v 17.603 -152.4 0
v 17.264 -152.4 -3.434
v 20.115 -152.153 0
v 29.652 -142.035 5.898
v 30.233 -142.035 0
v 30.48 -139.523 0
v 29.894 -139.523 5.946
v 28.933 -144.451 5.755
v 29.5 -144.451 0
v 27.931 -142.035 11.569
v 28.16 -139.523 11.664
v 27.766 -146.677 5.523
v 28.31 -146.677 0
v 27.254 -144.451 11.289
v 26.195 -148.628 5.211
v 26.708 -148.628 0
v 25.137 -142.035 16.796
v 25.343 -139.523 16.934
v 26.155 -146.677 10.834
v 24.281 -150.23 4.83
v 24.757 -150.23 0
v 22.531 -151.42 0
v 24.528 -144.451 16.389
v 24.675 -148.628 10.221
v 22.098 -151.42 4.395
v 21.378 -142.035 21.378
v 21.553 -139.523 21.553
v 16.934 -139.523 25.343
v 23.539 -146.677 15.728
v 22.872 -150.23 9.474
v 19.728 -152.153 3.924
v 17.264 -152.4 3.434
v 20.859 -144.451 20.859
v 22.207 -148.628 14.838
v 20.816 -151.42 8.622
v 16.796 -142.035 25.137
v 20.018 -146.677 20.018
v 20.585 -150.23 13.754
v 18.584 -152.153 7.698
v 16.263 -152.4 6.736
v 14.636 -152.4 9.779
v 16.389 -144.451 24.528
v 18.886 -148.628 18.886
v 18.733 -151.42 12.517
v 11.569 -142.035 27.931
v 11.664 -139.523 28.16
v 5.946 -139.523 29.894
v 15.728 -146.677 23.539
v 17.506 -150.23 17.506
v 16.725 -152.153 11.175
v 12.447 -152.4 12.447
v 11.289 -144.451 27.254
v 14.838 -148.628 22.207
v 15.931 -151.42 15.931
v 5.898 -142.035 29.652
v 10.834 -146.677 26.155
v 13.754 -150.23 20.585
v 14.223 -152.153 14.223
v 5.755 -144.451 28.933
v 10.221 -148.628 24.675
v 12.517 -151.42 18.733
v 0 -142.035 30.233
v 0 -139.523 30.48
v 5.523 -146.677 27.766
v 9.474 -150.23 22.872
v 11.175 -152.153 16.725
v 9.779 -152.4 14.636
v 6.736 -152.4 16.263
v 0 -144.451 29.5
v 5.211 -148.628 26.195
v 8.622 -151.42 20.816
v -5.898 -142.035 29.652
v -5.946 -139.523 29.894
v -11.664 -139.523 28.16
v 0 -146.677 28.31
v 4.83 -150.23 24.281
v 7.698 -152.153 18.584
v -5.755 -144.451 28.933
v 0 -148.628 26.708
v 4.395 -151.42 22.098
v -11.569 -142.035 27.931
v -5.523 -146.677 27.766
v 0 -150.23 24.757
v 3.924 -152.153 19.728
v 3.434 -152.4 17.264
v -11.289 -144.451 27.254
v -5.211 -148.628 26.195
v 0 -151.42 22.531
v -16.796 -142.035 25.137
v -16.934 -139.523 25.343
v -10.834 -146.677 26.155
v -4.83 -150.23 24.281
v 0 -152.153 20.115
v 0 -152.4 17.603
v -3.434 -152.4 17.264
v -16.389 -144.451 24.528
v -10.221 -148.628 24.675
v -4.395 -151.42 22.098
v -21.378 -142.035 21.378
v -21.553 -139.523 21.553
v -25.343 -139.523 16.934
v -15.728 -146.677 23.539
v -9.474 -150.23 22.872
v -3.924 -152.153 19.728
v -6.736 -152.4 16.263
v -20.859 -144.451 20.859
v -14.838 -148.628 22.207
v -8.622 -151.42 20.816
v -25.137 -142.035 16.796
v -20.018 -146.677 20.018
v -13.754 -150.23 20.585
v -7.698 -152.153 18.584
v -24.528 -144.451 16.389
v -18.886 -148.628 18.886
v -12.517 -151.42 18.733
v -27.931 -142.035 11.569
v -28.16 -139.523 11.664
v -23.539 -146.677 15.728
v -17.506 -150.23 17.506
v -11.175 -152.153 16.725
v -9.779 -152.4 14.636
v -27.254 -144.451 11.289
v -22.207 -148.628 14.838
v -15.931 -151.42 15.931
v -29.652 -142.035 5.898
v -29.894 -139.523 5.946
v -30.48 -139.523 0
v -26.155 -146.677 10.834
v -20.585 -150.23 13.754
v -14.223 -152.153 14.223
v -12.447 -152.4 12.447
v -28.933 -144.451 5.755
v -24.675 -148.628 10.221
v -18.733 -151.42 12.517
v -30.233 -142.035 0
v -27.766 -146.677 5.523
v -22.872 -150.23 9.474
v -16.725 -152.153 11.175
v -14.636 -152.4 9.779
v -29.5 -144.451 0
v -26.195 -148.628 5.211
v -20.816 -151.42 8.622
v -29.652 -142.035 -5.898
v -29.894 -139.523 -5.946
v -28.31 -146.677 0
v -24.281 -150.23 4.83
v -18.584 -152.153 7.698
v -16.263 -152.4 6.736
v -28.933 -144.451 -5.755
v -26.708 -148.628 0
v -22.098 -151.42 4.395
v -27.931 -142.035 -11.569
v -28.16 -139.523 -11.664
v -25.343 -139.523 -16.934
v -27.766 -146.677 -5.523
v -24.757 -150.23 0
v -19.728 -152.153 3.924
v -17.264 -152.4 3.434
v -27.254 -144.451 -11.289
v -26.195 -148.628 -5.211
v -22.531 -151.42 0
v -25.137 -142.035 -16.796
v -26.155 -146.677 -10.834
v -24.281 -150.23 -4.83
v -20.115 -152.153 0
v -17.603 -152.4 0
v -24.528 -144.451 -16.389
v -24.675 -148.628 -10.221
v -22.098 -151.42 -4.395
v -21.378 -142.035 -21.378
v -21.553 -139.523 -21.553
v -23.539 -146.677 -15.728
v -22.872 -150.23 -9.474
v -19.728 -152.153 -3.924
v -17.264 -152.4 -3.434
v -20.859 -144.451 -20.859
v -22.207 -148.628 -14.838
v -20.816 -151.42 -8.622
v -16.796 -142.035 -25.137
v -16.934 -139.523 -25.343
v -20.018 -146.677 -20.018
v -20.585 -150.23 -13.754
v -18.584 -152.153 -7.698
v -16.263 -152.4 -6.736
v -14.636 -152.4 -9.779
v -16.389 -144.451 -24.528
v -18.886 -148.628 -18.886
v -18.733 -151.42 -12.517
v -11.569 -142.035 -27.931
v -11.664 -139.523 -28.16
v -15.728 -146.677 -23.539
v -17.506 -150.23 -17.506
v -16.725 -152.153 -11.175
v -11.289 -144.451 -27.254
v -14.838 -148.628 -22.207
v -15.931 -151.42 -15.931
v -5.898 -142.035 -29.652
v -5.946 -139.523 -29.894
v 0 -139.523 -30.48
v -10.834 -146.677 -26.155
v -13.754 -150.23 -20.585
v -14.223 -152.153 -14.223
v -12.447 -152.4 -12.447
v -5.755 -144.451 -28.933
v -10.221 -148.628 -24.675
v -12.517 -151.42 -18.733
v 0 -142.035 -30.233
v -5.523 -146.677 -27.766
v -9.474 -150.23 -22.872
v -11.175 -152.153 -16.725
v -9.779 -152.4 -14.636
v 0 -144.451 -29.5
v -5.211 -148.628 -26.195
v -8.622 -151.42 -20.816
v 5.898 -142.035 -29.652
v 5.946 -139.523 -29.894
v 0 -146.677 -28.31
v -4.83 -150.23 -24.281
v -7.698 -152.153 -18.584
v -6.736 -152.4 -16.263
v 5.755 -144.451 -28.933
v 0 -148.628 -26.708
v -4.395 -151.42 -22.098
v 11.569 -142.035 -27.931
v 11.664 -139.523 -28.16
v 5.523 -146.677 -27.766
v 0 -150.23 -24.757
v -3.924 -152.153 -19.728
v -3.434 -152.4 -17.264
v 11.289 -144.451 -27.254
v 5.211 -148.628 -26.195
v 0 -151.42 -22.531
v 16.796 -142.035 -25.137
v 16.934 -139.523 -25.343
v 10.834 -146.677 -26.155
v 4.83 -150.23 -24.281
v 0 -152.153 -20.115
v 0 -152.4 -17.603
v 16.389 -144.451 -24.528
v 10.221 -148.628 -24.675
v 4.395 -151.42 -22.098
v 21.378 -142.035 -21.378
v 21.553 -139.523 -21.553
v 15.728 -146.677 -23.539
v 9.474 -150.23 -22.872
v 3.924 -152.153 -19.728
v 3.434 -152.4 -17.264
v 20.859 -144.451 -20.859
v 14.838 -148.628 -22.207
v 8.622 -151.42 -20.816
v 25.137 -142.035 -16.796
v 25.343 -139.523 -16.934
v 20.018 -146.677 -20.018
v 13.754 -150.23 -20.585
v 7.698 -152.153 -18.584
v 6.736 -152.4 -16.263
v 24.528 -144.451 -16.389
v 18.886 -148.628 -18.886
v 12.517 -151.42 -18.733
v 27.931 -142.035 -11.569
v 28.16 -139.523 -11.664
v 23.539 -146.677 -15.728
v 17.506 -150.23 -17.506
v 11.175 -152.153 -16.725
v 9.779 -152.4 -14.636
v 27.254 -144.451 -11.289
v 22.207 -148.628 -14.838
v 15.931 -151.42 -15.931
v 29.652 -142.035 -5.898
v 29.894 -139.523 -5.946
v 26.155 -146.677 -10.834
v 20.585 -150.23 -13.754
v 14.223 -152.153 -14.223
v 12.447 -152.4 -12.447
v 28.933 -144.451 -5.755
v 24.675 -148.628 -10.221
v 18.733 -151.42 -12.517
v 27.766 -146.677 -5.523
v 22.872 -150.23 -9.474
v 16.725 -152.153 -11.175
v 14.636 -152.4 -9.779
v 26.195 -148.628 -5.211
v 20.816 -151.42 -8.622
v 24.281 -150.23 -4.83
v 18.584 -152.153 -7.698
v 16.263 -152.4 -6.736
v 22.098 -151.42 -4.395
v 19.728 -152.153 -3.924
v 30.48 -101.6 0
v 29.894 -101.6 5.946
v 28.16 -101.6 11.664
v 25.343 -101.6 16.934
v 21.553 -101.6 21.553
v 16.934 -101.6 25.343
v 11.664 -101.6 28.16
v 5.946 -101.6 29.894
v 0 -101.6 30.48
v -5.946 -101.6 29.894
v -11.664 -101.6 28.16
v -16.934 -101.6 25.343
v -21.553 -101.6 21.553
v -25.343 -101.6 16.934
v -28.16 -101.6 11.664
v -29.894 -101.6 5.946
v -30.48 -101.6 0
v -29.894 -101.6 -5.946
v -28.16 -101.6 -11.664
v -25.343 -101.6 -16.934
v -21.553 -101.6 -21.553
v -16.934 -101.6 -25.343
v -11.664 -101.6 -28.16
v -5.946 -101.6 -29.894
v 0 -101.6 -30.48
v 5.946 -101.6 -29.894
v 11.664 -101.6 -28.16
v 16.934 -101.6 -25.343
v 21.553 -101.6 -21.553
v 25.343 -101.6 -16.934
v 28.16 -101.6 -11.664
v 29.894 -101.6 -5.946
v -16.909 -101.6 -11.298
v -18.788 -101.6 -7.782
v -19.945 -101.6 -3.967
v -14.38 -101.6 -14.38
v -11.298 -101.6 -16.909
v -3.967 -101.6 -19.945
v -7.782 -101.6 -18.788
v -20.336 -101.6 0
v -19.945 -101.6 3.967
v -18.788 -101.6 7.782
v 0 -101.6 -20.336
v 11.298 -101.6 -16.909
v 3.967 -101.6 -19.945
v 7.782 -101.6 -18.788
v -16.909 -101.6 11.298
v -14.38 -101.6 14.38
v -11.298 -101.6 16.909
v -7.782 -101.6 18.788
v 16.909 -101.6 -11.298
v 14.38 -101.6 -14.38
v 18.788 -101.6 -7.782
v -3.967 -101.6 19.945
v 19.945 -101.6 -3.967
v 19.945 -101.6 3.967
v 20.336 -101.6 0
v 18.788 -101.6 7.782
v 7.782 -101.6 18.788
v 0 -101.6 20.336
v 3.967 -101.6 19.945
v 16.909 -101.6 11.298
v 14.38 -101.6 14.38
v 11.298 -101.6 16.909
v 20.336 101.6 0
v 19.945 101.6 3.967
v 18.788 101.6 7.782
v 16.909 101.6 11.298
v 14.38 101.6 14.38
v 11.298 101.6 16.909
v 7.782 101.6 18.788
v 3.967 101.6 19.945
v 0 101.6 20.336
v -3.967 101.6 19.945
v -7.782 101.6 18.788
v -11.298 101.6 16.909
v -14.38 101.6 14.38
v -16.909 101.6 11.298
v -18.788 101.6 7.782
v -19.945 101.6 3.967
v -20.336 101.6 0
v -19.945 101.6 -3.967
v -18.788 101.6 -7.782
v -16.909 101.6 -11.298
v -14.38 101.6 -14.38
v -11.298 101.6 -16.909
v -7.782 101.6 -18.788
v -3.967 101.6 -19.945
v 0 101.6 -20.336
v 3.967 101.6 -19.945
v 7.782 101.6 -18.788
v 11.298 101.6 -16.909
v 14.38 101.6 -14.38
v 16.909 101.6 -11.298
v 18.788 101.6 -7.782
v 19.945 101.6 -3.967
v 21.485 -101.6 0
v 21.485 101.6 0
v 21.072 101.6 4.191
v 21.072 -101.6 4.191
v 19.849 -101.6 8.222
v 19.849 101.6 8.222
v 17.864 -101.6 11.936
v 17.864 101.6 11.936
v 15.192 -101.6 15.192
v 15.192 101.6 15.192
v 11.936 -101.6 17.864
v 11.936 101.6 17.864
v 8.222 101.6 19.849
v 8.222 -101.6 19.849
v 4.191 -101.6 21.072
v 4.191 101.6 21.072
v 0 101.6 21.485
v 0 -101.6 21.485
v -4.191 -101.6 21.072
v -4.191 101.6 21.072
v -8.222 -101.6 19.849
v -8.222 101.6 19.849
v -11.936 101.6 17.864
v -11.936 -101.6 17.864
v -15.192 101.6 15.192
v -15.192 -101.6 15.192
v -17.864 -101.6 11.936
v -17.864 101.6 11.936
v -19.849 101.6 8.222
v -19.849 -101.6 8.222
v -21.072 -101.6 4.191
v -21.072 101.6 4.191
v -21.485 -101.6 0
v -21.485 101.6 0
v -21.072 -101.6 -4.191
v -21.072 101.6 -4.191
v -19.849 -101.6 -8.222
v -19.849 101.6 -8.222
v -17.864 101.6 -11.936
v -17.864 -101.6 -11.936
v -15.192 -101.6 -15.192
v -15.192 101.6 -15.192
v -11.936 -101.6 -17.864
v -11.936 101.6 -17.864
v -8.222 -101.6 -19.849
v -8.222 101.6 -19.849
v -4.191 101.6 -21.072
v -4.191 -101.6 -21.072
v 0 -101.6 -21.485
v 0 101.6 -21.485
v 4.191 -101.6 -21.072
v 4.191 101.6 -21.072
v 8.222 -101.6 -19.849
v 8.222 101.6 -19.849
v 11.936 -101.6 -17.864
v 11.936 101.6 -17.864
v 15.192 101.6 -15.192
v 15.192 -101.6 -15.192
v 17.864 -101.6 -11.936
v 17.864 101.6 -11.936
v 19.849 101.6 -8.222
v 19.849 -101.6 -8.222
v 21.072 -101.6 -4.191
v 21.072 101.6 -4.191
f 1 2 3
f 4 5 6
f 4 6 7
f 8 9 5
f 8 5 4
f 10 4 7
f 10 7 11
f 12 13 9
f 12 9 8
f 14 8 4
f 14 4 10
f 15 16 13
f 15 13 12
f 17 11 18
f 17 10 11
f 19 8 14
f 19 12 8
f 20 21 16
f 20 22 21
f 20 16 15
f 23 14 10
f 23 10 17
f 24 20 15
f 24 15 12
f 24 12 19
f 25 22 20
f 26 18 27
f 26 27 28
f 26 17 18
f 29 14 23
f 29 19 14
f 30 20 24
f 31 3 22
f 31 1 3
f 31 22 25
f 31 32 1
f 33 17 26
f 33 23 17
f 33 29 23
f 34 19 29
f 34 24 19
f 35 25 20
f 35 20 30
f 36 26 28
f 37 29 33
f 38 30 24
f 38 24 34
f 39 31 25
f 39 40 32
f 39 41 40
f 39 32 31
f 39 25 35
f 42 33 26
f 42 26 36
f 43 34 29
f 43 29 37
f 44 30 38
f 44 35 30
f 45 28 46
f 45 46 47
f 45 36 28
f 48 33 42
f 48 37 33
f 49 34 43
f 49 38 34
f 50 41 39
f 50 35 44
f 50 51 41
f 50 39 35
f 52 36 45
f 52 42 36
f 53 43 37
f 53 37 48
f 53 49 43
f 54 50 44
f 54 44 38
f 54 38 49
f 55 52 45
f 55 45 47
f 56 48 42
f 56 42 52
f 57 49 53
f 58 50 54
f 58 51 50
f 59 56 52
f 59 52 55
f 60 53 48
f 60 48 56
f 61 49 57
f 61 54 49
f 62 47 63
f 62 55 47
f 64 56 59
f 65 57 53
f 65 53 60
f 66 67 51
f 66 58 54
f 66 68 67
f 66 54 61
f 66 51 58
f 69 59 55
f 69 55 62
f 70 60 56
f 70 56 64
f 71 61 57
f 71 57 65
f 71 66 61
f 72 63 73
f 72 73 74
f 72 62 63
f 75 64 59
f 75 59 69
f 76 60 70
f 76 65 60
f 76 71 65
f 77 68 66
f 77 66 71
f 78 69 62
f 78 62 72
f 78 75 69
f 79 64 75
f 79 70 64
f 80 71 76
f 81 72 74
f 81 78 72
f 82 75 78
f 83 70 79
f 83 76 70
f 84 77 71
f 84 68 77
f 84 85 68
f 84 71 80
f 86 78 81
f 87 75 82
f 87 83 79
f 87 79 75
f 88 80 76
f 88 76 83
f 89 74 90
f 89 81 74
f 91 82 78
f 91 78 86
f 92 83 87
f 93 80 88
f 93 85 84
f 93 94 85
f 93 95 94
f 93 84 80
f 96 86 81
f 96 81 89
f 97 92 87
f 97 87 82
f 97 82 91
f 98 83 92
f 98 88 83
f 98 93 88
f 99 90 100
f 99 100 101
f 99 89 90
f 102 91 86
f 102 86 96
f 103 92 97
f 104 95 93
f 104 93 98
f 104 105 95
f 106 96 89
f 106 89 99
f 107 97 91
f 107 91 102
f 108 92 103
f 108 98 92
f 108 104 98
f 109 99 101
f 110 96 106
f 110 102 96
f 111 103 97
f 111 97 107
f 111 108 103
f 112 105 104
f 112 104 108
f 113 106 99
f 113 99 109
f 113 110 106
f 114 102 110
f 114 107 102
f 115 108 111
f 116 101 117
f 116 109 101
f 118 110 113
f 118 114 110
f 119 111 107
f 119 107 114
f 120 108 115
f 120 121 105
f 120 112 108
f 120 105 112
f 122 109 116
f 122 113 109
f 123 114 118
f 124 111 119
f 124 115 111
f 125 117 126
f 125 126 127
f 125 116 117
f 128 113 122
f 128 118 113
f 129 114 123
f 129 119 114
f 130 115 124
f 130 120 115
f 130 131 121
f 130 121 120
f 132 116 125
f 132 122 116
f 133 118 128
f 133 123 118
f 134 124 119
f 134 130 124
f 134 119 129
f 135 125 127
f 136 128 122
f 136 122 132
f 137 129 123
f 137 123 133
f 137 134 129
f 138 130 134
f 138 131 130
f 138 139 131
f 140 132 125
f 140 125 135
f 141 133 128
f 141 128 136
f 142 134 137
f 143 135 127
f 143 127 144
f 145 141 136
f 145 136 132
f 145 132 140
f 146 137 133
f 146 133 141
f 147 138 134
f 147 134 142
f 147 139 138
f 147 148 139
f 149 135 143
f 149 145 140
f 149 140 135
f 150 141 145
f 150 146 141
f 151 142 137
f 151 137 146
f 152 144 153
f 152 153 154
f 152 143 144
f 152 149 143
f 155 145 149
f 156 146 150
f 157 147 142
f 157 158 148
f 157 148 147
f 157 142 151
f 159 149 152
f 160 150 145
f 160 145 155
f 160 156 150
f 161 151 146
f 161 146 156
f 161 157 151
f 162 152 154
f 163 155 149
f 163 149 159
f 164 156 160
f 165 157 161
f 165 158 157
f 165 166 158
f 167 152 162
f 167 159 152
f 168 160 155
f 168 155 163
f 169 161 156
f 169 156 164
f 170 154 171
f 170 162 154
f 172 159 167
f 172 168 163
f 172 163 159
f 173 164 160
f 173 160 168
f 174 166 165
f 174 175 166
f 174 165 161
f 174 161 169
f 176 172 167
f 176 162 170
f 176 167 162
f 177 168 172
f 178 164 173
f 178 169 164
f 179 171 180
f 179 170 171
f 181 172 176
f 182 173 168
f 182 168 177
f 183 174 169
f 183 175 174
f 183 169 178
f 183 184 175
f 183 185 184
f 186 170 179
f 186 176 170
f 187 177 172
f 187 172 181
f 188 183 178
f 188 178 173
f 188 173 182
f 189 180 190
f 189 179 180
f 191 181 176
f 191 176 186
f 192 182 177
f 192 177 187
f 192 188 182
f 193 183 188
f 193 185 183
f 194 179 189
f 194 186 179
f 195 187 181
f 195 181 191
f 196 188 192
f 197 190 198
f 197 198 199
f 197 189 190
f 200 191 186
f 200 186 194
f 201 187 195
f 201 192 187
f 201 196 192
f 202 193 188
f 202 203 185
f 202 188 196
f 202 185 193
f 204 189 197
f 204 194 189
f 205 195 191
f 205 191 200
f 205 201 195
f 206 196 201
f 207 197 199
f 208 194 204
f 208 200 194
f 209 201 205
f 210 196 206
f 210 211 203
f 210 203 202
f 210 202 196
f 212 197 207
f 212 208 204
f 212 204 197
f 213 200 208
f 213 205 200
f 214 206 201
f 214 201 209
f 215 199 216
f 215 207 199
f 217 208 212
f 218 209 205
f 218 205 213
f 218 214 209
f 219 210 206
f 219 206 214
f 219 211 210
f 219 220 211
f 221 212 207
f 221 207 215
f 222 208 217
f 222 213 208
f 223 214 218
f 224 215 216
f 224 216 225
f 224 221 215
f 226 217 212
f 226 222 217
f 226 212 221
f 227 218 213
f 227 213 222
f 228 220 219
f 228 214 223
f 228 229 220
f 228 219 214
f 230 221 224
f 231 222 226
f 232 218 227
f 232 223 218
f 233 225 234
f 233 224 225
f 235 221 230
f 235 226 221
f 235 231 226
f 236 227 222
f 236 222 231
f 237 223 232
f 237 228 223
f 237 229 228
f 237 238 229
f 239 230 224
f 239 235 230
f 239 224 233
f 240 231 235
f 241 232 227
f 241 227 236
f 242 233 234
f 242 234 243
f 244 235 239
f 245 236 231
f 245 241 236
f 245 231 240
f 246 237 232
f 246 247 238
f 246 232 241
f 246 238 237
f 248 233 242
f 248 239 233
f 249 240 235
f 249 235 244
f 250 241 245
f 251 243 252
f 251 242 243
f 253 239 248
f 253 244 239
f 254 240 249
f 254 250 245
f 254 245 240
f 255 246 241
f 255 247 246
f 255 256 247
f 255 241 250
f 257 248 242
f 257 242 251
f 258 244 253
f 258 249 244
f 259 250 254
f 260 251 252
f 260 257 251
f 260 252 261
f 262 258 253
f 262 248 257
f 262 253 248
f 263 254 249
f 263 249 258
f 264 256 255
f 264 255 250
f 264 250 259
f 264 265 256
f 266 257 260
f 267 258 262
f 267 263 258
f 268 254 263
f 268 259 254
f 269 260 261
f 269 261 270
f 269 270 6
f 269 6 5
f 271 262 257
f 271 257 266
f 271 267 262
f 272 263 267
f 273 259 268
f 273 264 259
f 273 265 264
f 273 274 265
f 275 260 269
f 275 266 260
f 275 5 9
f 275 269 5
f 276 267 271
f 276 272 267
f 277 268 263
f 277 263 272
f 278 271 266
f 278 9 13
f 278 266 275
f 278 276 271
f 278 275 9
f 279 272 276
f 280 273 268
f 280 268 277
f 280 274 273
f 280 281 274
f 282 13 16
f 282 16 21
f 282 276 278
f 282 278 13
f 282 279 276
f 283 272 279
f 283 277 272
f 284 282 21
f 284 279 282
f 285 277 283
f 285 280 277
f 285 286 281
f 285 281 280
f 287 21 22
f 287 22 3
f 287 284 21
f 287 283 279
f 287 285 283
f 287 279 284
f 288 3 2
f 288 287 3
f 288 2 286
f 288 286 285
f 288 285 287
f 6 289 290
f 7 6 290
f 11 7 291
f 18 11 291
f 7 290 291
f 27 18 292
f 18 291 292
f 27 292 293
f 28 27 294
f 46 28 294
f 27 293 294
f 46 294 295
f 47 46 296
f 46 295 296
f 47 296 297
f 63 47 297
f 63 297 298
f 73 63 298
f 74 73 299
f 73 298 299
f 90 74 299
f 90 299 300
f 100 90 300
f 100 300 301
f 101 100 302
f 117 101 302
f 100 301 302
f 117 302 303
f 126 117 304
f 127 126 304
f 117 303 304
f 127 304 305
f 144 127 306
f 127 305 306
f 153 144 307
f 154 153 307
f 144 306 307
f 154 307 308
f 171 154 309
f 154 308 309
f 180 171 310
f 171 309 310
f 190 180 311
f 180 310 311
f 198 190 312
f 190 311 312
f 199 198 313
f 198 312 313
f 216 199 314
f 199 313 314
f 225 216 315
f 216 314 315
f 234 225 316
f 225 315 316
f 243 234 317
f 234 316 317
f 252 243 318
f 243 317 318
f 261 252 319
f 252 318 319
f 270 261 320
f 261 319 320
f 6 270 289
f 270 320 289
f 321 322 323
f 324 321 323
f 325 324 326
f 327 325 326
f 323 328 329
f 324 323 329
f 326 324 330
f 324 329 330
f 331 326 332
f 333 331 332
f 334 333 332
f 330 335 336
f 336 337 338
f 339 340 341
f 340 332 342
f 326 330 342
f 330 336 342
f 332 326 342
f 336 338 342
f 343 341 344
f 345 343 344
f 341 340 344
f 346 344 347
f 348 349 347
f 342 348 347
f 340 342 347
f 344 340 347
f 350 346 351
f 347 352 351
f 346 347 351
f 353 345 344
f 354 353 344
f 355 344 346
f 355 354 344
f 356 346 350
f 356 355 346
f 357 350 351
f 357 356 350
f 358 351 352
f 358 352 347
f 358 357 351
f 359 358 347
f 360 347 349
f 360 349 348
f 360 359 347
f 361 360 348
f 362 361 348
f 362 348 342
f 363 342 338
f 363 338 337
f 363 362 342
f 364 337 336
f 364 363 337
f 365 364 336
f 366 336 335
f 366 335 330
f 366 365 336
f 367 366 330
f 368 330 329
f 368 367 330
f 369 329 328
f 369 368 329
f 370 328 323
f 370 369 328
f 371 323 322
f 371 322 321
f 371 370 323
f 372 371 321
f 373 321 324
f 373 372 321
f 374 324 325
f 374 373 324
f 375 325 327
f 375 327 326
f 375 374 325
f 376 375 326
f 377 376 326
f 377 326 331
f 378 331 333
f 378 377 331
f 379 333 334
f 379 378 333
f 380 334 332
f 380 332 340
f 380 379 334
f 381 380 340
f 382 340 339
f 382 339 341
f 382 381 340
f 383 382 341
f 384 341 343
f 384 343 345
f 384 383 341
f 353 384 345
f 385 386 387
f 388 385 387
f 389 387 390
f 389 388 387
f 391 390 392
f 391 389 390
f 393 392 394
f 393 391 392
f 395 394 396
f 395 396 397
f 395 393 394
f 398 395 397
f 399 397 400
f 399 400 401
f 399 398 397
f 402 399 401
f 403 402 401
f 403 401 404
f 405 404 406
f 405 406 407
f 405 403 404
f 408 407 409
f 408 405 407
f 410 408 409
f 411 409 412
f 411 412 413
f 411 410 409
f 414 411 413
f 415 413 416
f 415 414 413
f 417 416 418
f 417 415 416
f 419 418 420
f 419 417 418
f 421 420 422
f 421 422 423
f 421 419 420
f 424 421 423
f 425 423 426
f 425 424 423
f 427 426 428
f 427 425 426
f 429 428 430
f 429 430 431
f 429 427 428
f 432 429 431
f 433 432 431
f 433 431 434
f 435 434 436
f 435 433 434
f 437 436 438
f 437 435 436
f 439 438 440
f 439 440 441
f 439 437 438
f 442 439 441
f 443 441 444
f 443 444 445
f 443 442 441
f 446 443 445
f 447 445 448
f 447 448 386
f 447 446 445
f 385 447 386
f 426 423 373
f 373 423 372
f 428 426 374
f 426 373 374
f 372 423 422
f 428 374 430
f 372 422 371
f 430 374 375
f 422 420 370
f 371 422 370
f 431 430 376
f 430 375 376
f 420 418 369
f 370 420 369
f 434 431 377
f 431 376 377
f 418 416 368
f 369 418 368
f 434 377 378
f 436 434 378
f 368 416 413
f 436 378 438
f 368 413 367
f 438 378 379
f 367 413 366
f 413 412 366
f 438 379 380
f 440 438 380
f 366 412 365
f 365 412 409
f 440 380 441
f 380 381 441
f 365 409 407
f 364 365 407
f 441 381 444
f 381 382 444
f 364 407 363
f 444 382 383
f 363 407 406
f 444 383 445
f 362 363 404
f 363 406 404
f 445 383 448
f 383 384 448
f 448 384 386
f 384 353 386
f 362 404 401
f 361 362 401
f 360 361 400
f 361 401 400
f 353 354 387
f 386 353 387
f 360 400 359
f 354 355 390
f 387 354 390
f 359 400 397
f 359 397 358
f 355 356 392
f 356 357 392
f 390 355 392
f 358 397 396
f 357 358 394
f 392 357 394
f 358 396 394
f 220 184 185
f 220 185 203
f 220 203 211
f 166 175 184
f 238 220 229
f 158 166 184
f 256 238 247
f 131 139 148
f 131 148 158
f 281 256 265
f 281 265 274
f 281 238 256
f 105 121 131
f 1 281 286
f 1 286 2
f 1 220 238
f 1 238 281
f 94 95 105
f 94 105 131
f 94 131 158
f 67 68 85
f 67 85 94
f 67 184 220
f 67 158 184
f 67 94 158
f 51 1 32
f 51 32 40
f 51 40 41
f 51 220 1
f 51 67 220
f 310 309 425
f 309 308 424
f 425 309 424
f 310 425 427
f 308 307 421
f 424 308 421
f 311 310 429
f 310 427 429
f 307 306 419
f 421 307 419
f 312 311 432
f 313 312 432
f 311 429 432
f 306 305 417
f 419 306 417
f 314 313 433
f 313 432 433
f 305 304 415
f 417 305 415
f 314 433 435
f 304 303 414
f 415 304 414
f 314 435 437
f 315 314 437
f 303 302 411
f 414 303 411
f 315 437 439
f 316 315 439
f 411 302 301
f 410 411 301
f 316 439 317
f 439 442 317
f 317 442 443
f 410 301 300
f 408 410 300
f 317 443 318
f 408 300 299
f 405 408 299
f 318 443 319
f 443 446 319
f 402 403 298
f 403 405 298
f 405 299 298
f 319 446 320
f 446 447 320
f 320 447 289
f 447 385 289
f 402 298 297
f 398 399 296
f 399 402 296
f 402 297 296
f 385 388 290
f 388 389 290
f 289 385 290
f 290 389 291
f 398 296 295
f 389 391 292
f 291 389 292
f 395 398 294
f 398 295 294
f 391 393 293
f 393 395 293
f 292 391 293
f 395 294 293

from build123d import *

# Parameters (mm, degrees)
F0_R     = 21.484759
F0_R_2   = 20.336047
F1_DEPTH = 101.6
F2_R     = 30.47998
F3_DEPTH = 50.8
F4_R     = 12.877415


with BuildPart() as f1:
    # F0 (on Front) → F1 (new body, symmetric)
    with BuildSketch(Plane.XZ):
        Circle(F0_R)
        Circle(F0_R_2, mode=Mode.SUBTRACT)
    extrude(amount=F1_DEPTH, both=True)

    # F2 (on face) → F3 (join)
    with BuildSketch(Plane.XZ.offset(101.6)):
        Circle(F2_R)
    extrude(amount=F3_DEPTH)

    # F4
    f4_edges = [f1.edges().sort_by_distance(p)[0] for p in [
        (-30.47998, -152.4, 0),
    ]]
    fillet(f4_edges, radius=F4_R)


solid = f1.part
